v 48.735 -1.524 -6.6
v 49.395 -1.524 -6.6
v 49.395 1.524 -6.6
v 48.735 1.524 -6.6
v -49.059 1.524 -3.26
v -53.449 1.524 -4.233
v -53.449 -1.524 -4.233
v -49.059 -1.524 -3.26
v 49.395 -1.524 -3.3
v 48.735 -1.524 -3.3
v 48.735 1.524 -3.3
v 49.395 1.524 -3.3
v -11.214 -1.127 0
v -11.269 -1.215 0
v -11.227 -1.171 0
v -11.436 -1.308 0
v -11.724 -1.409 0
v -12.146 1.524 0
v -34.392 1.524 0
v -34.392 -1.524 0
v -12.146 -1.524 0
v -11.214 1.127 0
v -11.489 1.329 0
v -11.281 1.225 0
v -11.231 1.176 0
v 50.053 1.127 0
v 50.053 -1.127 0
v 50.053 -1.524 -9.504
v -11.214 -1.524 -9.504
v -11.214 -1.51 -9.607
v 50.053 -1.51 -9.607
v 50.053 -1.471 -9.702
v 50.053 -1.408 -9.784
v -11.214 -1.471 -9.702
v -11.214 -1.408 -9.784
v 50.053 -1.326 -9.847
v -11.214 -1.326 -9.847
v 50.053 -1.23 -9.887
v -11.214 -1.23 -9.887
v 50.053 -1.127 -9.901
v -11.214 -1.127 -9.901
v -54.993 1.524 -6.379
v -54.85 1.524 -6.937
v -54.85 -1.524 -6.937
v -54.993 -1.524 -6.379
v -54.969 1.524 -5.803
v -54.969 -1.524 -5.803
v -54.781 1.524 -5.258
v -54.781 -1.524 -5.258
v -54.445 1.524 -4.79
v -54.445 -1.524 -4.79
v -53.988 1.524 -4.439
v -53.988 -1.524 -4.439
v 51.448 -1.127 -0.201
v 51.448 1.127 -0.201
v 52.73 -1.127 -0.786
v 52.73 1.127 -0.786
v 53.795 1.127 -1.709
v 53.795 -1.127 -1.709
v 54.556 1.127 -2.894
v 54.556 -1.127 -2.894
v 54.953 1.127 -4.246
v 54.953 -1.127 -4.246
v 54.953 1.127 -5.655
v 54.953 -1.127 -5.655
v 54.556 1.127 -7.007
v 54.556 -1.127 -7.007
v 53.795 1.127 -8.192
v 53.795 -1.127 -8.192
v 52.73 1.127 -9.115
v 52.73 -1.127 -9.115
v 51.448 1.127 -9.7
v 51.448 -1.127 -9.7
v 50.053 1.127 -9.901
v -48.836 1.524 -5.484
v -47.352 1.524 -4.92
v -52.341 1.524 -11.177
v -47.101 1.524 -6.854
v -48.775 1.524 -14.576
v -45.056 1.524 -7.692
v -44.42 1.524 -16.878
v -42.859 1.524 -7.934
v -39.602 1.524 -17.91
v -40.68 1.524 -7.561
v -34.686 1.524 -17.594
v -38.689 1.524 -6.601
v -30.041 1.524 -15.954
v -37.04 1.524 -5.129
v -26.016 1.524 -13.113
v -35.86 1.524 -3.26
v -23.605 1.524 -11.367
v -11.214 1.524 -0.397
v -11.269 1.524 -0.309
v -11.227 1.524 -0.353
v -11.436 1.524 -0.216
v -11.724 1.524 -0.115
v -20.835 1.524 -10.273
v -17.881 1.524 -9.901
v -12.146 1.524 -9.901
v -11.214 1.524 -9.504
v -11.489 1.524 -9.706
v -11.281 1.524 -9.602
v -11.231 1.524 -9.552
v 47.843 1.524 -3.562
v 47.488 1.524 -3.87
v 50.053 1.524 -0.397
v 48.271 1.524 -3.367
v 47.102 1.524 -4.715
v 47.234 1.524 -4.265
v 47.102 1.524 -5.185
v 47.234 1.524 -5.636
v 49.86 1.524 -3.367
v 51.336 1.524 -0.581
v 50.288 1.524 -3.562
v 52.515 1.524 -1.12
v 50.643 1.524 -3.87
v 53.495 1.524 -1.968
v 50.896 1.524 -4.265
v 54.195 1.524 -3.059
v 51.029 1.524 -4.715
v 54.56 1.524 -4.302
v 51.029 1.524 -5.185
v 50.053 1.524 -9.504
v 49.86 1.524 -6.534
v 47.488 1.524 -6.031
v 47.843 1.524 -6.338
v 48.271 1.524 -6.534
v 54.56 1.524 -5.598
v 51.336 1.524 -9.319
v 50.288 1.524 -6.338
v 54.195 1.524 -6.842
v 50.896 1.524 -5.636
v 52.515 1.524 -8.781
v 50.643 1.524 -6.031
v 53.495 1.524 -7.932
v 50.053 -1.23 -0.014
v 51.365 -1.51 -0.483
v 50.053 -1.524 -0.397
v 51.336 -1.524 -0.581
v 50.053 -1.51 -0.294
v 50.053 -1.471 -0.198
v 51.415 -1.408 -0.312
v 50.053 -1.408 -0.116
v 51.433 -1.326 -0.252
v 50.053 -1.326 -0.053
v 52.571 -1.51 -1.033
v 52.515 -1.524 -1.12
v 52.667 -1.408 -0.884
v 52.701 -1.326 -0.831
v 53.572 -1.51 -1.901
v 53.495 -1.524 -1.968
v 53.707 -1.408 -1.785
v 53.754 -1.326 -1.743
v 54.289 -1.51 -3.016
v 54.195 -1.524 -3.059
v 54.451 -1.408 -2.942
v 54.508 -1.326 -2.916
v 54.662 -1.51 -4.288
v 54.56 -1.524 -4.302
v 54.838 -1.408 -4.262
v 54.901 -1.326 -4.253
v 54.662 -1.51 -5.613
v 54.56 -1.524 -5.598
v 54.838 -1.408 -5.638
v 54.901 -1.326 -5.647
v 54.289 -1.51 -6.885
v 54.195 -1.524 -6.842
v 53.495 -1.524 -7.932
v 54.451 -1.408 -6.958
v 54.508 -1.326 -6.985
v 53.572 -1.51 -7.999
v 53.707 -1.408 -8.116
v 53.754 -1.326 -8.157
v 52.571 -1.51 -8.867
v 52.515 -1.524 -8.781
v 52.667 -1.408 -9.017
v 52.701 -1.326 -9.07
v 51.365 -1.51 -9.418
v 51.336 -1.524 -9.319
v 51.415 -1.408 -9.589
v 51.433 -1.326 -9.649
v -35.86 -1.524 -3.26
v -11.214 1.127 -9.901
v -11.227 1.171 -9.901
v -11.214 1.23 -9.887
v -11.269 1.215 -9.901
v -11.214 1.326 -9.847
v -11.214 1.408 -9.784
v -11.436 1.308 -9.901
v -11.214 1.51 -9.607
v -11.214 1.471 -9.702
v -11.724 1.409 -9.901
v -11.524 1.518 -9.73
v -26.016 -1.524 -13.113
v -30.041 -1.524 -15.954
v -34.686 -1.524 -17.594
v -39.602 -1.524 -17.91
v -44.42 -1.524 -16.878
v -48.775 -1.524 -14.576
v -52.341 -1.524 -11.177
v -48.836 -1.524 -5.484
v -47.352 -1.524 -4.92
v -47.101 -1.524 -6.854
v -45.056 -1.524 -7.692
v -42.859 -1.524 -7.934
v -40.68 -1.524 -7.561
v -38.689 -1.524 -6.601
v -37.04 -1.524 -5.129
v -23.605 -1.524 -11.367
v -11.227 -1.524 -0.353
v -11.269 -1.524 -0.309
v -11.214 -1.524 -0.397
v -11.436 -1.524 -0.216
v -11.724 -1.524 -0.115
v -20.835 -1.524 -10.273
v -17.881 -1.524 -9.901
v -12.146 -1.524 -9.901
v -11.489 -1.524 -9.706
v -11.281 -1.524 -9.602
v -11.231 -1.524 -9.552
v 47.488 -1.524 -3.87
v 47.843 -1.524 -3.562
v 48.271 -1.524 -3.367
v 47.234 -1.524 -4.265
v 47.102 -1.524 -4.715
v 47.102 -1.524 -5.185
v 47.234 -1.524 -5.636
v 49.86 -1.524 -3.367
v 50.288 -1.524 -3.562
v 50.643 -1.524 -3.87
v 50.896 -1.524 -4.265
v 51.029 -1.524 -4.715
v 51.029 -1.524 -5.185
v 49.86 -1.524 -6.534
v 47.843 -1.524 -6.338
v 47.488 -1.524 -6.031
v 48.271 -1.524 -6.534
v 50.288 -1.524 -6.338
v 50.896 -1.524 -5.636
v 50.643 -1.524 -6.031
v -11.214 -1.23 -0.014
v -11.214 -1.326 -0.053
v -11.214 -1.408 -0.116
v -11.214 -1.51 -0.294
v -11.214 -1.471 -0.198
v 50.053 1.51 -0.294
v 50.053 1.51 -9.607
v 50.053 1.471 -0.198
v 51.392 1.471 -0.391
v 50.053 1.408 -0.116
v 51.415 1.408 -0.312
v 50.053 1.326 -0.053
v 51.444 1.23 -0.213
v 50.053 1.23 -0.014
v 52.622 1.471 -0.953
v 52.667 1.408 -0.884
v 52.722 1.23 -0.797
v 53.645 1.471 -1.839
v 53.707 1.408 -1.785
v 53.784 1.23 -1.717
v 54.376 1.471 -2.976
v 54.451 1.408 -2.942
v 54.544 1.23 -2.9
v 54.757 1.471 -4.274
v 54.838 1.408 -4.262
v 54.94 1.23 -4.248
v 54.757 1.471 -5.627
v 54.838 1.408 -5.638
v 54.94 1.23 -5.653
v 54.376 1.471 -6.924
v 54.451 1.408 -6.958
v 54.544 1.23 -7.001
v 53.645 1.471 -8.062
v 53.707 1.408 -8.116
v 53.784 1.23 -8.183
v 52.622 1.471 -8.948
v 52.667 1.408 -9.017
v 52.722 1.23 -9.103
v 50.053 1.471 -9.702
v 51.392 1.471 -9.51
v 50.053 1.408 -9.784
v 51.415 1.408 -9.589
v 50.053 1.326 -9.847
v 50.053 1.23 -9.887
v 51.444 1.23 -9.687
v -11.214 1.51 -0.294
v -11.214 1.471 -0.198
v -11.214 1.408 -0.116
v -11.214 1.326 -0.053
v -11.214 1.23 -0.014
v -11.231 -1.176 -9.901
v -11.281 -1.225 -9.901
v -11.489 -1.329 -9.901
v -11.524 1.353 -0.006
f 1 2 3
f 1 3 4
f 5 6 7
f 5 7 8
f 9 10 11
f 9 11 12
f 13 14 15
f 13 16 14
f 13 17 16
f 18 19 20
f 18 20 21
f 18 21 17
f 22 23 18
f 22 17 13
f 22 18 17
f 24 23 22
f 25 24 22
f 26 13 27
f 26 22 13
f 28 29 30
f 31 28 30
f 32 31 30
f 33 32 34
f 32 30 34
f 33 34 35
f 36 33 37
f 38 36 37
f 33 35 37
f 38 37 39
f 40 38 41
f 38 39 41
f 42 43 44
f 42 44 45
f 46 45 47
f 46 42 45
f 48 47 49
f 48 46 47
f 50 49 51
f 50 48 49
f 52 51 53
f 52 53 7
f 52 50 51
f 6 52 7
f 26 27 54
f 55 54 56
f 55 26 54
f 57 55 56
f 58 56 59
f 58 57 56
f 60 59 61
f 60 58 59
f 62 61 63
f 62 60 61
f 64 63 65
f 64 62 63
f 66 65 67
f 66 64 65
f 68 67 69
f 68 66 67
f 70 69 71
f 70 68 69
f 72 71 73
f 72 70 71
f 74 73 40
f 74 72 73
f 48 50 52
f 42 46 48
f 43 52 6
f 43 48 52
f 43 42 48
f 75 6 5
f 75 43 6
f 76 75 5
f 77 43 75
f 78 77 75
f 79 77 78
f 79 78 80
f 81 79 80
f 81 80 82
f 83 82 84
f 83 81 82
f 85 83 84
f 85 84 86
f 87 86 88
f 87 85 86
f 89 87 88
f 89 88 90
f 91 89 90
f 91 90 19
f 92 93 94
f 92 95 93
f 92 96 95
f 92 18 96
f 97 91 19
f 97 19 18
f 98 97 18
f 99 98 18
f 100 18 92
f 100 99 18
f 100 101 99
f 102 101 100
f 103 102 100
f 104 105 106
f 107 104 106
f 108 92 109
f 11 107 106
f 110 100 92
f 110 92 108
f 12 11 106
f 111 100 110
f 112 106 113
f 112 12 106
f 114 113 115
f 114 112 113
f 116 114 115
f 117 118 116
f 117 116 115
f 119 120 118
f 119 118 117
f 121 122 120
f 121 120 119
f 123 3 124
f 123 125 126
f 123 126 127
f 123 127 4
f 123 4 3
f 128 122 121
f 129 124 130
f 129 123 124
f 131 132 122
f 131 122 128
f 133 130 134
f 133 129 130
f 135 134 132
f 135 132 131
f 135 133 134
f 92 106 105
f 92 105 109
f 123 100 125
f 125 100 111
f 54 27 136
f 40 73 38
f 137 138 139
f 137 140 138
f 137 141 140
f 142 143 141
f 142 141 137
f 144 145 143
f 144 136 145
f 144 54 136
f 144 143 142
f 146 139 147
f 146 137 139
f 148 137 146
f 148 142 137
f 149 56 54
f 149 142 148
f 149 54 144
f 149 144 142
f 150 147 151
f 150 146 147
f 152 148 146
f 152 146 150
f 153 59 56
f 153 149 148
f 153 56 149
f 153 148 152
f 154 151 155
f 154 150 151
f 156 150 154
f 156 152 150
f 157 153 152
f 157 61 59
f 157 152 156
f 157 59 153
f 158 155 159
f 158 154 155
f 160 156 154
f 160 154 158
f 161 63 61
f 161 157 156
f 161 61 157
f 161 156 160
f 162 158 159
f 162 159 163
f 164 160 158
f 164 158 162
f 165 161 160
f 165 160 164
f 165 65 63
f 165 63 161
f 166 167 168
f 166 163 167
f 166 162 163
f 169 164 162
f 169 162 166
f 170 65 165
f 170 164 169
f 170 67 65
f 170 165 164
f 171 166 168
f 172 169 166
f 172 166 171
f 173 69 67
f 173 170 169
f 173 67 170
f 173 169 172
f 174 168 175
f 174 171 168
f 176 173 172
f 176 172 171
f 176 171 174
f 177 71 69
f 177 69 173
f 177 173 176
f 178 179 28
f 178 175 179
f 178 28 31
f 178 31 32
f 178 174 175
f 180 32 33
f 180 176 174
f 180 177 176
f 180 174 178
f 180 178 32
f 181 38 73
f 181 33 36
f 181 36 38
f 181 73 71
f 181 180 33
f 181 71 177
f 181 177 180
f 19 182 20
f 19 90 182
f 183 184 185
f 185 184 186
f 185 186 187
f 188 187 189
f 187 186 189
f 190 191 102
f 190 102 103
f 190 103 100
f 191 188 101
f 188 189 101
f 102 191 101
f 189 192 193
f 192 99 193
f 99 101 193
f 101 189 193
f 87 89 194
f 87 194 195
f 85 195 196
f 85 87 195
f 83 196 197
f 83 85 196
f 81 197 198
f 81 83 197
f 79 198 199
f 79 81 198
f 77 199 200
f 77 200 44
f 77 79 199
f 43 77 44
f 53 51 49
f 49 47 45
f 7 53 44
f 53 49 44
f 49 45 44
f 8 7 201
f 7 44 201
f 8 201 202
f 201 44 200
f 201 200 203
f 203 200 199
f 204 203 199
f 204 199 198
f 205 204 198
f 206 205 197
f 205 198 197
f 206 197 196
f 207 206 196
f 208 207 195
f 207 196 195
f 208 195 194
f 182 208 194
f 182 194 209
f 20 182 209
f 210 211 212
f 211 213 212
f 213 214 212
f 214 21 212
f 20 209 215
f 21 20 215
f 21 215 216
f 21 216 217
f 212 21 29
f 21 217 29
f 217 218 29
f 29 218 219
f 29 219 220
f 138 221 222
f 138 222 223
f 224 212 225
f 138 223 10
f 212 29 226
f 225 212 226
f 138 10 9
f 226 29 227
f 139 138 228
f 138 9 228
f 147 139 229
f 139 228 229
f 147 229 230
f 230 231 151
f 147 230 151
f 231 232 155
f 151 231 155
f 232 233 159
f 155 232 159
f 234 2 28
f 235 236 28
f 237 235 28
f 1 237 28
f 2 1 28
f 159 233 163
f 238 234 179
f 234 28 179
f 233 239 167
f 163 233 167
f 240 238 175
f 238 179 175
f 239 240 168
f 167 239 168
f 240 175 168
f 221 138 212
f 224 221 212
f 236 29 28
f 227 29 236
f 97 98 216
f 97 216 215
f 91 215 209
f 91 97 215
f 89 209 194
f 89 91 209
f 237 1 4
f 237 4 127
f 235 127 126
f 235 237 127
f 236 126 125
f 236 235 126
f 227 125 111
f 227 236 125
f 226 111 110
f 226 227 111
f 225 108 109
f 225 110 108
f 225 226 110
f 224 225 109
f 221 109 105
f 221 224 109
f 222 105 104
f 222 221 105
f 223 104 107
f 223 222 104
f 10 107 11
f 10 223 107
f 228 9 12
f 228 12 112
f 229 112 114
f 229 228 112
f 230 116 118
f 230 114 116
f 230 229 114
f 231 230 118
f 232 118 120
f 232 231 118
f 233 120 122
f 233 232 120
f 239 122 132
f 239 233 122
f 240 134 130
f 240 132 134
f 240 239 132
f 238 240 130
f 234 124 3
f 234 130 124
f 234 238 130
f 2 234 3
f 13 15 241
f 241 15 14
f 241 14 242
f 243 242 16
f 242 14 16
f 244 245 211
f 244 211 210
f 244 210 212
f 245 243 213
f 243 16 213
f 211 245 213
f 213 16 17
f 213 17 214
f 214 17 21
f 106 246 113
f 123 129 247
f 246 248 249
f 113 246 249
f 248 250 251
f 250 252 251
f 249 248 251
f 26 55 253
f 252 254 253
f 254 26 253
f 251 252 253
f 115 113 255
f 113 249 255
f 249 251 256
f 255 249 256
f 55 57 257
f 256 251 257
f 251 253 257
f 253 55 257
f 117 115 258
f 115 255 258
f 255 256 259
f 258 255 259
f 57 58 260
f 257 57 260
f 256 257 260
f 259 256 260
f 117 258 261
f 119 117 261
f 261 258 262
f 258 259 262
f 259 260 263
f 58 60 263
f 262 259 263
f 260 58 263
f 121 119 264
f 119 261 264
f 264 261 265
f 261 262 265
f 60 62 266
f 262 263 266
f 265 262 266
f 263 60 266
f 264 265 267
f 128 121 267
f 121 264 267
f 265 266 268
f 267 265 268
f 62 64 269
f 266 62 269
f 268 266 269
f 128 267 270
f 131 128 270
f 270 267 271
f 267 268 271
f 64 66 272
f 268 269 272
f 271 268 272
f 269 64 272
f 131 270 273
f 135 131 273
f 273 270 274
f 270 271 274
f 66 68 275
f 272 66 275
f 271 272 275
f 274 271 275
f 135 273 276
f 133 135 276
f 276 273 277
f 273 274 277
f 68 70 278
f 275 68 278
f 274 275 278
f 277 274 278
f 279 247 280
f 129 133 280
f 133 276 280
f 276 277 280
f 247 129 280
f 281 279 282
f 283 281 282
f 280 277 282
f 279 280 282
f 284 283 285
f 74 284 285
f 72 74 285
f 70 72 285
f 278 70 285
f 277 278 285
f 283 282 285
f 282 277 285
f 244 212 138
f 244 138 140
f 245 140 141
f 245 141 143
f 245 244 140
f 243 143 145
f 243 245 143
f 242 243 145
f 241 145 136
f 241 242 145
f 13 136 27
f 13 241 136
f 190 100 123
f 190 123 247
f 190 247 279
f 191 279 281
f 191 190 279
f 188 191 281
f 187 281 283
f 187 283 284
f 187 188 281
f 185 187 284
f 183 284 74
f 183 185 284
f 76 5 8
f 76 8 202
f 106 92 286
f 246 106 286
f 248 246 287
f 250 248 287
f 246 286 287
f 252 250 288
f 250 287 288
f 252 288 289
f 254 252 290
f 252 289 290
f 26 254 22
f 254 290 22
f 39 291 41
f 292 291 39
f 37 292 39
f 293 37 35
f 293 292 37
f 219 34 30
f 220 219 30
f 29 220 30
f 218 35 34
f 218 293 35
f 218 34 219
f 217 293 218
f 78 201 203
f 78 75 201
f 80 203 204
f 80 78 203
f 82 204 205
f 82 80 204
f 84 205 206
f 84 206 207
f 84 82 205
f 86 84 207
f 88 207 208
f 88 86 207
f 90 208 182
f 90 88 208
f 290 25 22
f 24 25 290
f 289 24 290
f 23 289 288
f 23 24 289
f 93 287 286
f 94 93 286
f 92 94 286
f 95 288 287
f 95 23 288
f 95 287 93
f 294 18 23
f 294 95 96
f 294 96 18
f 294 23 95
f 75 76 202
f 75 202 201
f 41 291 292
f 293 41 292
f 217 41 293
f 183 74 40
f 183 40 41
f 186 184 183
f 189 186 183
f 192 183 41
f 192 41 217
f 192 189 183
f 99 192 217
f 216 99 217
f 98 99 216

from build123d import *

# Parameters (mm, degrees)
F1_OUTLINE_DEPTH            = 1.524
F2_SLOT_DEPTH               = 58.881120617
F2_SLOT_DEPTH_BACK          = 58.881120617
F3A_HANDLEROUNDS_DEPTH      = 50.053367
F3A_HANDLEROUNDS_DEPTH_BACK = 11.2136936
F3B_ENDROUND_ANGLE          = 180
F4_RUNOUT_TOP_POS_ANGLE     = 90
F4_RUNOUT_BOT_POS_ANGLE     = 90
F4_RUNOUT_TOP_NEG_ANGLE     = 90
F4_RUNOUT_BOT_NEG_ANGLE     = 90


with BuildPart() as part:
    # SK_F1_Outline → F1_Outline (new, symmetric)
    with BuildSketch(Plane(origin=(0, 0, 0), x_dir=(1, 0, 0), z_dir=(0, 1, 0))):
        with BuildLine():
            Line((-34.3917778, 0), (50.053367, 0))
            ThreePointArc((50.053367, 0), (55.0037, 4.950333), (50.053367, 9.900666))
            Line((50.053367, 9.900666), (-17.8811936, 9.900666))
            ThreePointArc((-17.8811936, 9.900666), (-22.254213469, 10.732825234), (-26.01595, 13.1129786))
            ThreePointArc((-26.01595, 13.1129786), (-42.046618803, 17.559873613), (-54.849649, 6.9372734))
            ThreePointArc((-54.849649, 6.9372734), (-54.781279257, 5.257869905), (-53.4488136, 4.2333672))
            Line((-53.4488136, 4.2333672), (-49.0586522, 3.26009))
            Line((-49.0586522, 3.26009), (-47.3517722, 4.920488))
            Line((-47.3517722, 4.920488), (-48.8359196, 5.483987))
            ThreePointArc((-48.8359196, 5.483987), (-41.756588445, 7.823426138), (-35.8603296, 3.26009))
            Line((-35.8603296, 3.26009), (-34.3917778, 0))
        make_face()
    extrude(amount=F1_OUTLINE_DEPTH, both=True)

    # SK_F2_Slot → F2_Slot (cut, two sides: drawn at the far end of the back side and taken through both)
    with BuildSketch(Plane(origin=(0, 0, 0), x_dir=(1, 0, 0), z_dir=(0, 1, 0)).offset(-F2_SLOT_DEPTH_BACK)):
        with BuildLine():
            Line((48.7354118, 3.300222), (49.3954308, 3.300222))
            ThreePointArc((49.3954308, 3.300222), (51.0455418, 4.950333), (49.3954308, 6.600444))
            Line((49.3954308, 6.600444), (48.7354118, 6.600444))
            ThreePointArc((48.7354118, 6.600444), (47.0853008, 4.950333), (48.7354118, 3.300222))
        make_face()
    extrude(amount=F2_SLOT_DEPTH + F2_SLOT_DEPTH_BACK, mode=Mode.SUBTRACT)

    # SK_F3_StraightRounds → F3a_HandleRounds (cut, two sides: drawn at the far end of the back side and taken through both)
    with BuildSketch(Plane(origin=(0, 0, 0), x_dir=(0, 0, -1), z_dir=(1, 0, 0)).offset(-F3A_HANDLEROUNDS_DEPTH_BACK)):
        with BuildLine():
            Line((0, 1.127125), (-0.254, 1.127125))
            Line((-0.254, 1.127125), (-0.254, 1.778))
            Line((-0.254, 1.778), (0.396875, 1.778))
            Line((0.396875, 1.778), (0.396875, 1.524))
            ThreePointArc((0.396875, 1.524), (0.116241996, 1.407758004), (0, 1.127125))
        make_face()
        with BuildLine():
            Line((9.900666, 1.127125), (10.154666, 1.127125))
            Line((10.154666, 1.127125), (10.154666, 1.778))
            Line((10.154666, 1.778), (9.503791, 1.778))
            Line((9.503791, 1.778), (9.503791, 1.524))
            ThreePointArc((9.503791, 1.524), (9.784424004, 1.407758004), (9.900666, 1.127125))
        make_face()
        with BuildLine():
            Line((0, -1.127125), (-0.254, -1.127125))
            Line((-0.254, -1.127125), (-0.254, -1.778))
            Line((-0.254, -1.778), (0.396875, -1.778))
            Line((0.396875, -1.778), (0.396875, -1.524))
            ThreePointArc((0.396875, -1.524), (0.116241996, -1.407758004), (0, -1.127125))
        make_face()
        with BuildLine():
            Line((9.900666, -1.127125), (10.154666, -1.127125))
            Line((10.154666, -1.127125), (10.154666, -1.778))
            Line((10.154666, -1.778), (9.503791, -1.778))
            Line((9.503791, -1.778), (9.503791, -1.524))
            ThreePointArc((9.503791, -1.524), (9.784424004, -1.407758004), (9.900666, -1.127125))
        make_face()
    extrude(amount=F3A_HANDLEROUNDS_DEPTH + F3A_HANDLEROUNDS_DEPTH_BACK, mode=Mode.SUBTRACT)

    # SK_F3_EndRound → F3b_EndRound (revolve, symmetric, cut)
    with BuildSketch(Plane.XY.offset(-4.950333)) as f3b_endround_sk:
        with BuildLine():
            Line((55.0037, 1.127125), (55.2577, 1.127125))
            Line((55.2577, 1.127125), (55.2577, 1.778))
            Line((55.2577, 1.778), (54.606825, 1.778))
            Line((54.606825, 1.778), (54.606825, 1.524))
            ThreePointArc((54.606825, 1.524), (54.887458004, 1.407758004), (55.0037, 1.127125))
        make_face()
        with BuildLine():
            Line((55.0037, -1.127125), (55.2577, -1.127125))
            Line((55.2577, -1.127125), (55.2577, -1.778))
            Line((55.2577, -1.778), (54.606825, -1.778))
            Line((54.606825, -1.778), (54.606825, -1.524))
            ThreePointArc((54.606825, -1.524), (54.887458004, -1.407758004), (55.0037, -1.127125))
        make_face()
    revolve(axis=Axis((50.053367, -2.54, -4.950333), (0, 1, 0)), revolution_arc=F3B_ENDROUND_ANGLE / 2, mode=Mode.SUBTRACT)
    revolve(f3b_endround_sk.sketch, axis=Axis((50.053367, -2.54, -4.950333), (0, -1, 0)), revolution_arc=F3B_ENDROUND_ANGLE / 2, mode=Mode.SUBTRACT)

    # SK_F4_Runout1 → F4_Runout_Top_Pos (revolve, cut)
    with BuildSketch(Plane(origin=(0, 1.127125, 0), x_dir=(1, 0, 0), z_dir=(0, 1, 0))):
        Polygon((-11.2136936, 0), (-12.1460006, -0.164390878), (-12.1460006, -0.365125), (-11.2136936, -0.365125), align=None)
    revolve(axis=Axis((-9.9436936, 1.127125, -0.396875), (-1, 0, 0)), revolution_arc=F4_RUNOUT_TOP_POS_ANGLE, mode=Mode.SUBTRACT)

    # SK_F4_Runout2 → F4_Runout_Bot_Pos (revolve, cut)
    with BuildSketch(Plane(origin=(0, 1.127125, 0), x_dir=(1, 0, 0), z_dir=(0, 1, 0))):
        Polygon((-11.2136936, 9.900666), (-12.1460006, 10.065056878), (-12.1460006, 10.265791), (-11.2136936, 10.265791), align=None)
    revolve(axis=Axis((-9.9436936, 1.127125, -9.503791), (1, 0, 0)), revolution_arc=F4_RUNOUT_BOT_POS_ANGLE, mode=Mode.SUBTRACT)

    # SK_F4_Runout3 → F4_Runout_Top_Neg (revolve, cut)
    with BuildSketch(Plane(origin=(0, -1.127125, 0), x_dir=(1, 0, 0), z_dir=(0, 1, 0))):
        Polygon((-11.2136936, 0), (-12.1460006, -0.164390878), (-12.1460006, -0.365125), (-11.2136936, -0.365125), align=None)
    revolve(axis=Axis((-9.9436936, -1.127125, -0.396875), (1, 0, 0)), revolution_arc=F4_RUNOUT_TOP_NEG_ANGLE, mode=Mode.SUBTRACT)

    # SK_F4_Runout4 → F4_Runout_Bot_Neg (revolve, cut)
    with BuildSketch(Plane(origin=(0, -1.127125, 0), x_dir=(1, 0, 0), z_dir=(0, 1, 0))):
        Polygon((-11.2136936, 9.900666), (-12.1460006, 10.065056878), (-12.1460006, 10.265791), (-11.2136936, 10.265791), align=None)
    revolve(axis=Axis((-9.9436936, -1.127125, -9.503791), (-1, 0, 0)), revolution_arc=F4_RUNOUT_BOT_NEG_ANGLE, mode=Mode.SUBTRACT)


solid = part.part
